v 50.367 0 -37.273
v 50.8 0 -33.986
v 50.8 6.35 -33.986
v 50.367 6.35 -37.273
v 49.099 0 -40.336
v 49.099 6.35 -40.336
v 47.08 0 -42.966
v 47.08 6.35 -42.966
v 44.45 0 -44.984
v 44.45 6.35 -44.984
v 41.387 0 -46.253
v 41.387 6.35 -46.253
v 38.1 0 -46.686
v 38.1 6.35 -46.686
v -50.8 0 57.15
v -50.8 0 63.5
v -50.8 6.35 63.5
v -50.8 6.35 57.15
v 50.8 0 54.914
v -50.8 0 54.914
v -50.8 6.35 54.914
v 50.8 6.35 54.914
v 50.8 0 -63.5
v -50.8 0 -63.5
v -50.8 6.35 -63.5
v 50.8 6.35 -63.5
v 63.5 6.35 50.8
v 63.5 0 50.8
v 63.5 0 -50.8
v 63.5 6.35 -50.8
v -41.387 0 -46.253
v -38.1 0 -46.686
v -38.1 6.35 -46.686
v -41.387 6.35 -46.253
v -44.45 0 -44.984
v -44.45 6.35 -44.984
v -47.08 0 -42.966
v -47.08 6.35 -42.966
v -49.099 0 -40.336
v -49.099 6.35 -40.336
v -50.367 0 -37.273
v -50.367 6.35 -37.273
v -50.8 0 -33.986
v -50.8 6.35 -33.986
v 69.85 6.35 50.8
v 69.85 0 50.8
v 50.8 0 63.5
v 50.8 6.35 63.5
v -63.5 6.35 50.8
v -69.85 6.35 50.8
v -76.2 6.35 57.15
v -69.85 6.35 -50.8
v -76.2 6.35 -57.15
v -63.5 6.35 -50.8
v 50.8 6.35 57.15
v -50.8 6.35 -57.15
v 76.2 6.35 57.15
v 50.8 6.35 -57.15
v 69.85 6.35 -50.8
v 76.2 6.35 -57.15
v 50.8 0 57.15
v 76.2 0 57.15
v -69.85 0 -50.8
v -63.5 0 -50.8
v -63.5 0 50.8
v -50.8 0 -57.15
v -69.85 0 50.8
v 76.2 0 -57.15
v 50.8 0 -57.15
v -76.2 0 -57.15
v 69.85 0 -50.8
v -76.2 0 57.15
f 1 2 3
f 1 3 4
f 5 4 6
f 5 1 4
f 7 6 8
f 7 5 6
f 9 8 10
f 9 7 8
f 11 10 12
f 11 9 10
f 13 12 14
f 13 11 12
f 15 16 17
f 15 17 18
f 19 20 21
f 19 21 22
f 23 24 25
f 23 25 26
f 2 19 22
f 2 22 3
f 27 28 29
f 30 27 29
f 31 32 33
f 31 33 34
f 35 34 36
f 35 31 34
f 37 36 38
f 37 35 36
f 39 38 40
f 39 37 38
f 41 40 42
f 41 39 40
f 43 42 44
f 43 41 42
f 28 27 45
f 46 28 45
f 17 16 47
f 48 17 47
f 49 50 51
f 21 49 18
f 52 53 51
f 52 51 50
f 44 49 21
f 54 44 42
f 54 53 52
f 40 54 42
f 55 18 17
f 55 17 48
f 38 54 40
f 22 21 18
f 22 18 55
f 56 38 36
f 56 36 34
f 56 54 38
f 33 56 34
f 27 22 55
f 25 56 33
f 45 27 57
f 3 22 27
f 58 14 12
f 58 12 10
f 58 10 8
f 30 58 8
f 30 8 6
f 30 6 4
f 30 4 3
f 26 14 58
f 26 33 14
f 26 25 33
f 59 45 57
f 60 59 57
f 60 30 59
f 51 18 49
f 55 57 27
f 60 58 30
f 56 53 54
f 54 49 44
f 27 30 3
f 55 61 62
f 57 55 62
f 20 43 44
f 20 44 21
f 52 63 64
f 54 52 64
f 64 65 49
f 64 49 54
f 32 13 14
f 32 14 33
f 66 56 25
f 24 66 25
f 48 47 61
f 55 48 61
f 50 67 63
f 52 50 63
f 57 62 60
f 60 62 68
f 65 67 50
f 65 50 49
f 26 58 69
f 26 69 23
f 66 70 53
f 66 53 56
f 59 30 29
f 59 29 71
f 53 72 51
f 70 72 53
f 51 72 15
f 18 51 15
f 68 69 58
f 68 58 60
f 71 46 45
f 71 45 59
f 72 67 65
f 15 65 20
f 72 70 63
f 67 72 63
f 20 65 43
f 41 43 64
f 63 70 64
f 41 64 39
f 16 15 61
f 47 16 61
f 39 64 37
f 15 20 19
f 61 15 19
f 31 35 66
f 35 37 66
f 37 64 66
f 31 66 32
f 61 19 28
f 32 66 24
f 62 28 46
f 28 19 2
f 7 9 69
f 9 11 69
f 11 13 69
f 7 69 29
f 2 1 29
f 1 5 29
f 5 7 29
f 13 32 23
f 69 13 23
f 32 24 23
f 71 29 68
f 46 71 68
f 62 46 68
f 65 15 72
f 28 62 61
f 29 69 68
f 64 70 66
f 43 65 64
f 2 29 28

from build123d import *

# Parameters (mm, degrees)
SKETCH1_W               = 152.4
SKETCH1_H               = 127
BOSS_EXTRUDE1_DEPTH     = 6.35
SKETCH2_W               = 25.4
SKETCH2_H               = 6.35
SKETCH2_W_2             = 6.35
SKETCH2_H_2             = 101.6
CUT_EXTRUDE1_DEPTH      = 7.35
CUT_EXTRUDE1_DEPTH_BACK = 6.35
CUT_EXTRUDE2_DEPTH      = 127
CUT_EXTRUDE2_DEPTH_BACK = 127


with BuildPart() as part:
    # Sketch1 → Boss-Extrude1 (new body)
    with BuildSketch(Plane(origin=(0, 0, 0), x_dir=(1, 0, 0), z_dir=(0, 1, 0))):
        Rectangle(SKETCH1_W, SKETCH1_H)
    extrude(amount=BOSS_EXTRUDE1_DEPTH)

    # Sketch2 → Cut-Extrude1 (cut, two sides)
    with BuildSketch(Plane(origin=(0, 0, 0), x_dir=(1, 0, 0), z_dir=(0, 1, 0))) as cut_extrude1_sk:
        with Locations((-63.5, 60.325)):
            Rectangle(SKETCH2_W, SKETCH2_H)
        with Locations((-63.5, -60.325)):
            Rectangle(SKETCH2_W, SKETCH2_H)
        with Locations((63.5, -60.325)):
            Rectangle(SKETCH2_W, SKETCH2_H)
        with Locations((63.5, 60.325)):
            Rectangle(SKETCH2_W, SKETCH2_H)
        with Locations((66.675, 0)):
            Rectangle(SKETCH2_W_2, SKETCH2_H_2)
        with Locations((-66.675, 0)):
            Rectangle(SKETCH2_W_2, SKETCH2_H_2)
    extrude(amount=CUT_EXTRUDE1_DEPTH, mode=Mode.SUBTRACT)
    extrude(cut_extrude1_sk.sketch, amount=-CUT_EXTRUDE1_DEPTH_BACK, mode=Mode.SUBTRACT)

    # Sketch3 → Cut-Extrude2 (cut, two sides)
    with BuildSketch(Plane(origin=(0, 0, 0), x_dir=(1, 0, 0), z_dir=(0, 1, 0))) as cut_extrude2_sk:
        with BuildLine():
            Line((-50.8, -54.914183245), (50.8, -54.914183245))
            Line((50.8, -54.914183245), (50.8, 33.985816755))
            ThreePointArc((50.8, 33.985816755), (47.080256121, 42.966072876), (38.1, 46.685816755))
            Line((38.1, 46.685816755), (-38.1, 46.685816755))
            ThreePointArc((-38.1, 46.685816755), (-47.080256121, 42.966072876), (-50.8, 33.985816755))
            Line((-50.8, 33.985816755), (-50.8, -54.914183245))
        make_face()
    extrude(amount=CUT_EXTRUDE2_DEPTH, mode=Mode.SUBTRACT)
    extrude(cut_extrude2_sk.sketch, amount=-CUT_EXTRUDE2_DEPTH_BACK, mode=Mode.SUBTRACT)


solid = part.part
